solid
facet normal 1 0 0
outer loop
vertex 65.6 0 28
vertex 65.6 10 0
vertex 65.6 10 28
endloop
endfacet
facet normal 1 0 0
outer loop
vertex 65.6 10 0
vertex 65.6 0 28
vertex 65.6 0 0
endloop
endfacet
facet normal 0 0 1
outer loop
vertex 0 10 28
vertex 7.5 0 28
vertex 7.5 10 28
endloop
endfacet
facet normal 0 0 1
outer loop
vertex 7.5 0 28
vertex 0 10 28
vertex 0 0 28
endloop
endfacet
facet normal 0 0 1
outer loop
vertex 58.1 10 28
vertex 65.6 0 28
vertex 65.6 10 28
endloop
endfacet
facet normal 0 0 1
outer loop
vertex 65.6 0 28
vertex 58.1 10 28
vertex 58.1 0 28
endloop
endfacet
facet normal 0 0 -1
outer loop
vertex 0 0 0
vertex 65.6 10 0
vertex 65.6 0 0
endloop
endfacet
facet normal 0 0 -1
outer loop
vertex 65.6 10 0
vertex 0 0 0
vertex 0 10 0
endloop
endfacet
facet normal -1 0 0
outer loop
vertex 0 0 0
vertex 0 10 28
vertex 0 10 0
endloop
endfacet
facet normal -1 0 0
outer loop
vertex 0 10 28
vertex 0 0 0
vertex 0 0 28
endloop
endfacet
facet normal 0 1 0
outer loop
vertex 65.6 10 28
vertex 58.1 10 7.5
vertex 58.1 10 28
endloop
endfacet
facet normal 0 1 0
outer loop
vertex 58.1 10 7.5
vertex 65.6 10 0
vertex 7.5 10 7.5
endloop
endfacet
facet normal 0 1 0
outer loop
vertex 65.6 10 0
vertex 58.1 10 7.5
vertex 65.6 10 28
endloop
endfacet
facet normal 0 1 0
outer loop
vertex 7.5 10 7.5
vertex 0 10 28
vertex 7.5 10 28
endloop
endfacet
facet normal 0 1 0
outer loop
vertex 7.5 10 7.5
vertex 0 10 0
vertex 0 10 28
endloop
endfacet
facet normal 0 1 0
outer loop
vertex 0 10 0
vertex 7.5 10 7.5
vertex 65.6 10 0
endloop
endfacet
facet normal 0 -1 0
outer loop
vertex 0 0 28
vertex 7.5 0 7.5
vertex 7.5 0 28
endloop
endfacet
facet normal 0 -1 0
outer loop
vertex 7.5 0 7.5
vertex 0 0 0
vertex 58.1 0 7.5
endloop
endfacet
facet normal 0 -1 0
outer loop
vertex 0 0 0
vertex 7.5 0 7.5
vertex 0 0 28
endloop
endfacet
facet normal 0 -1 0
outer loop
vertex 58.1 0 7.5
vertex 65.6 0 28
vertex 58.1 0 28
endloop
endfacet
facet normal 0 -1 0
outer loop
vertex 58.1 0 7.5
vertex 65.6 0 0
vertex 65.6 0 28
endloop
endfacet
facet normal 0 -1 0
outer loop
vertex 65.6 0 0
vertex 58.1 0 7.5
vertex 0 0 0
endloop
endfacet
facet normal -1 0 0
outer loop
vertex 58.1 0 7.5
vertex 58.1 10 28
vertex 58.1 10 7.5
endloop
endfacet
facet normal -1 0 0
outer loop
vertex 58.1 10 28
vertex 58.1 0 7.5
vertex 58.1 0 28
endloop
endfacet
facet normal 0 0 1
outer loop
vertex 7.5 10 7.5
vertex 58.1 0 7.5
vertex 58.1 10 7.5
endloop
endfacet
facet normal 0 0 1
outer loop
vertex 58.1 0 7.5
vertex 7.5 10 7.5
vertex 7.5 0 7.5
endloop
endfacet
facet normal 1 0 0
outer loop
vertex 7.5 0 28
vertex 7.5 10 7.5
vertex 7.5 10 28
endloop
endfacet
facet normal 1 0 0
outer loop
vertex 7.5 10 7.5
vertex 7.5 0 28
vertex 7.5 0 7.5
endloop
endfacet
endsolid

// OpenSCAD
$fa=4; // default minimum facet angle is now 0.5
$fs=0.05; // default minimum facet size is now 0.05 mm

wallThickness = 7.5;
legThickness = 20.5;
legWidth = 50.6;
legGroundAngle=72.9;

laptopThickness = 16.2;
laptopGap = 1;

bracketHeight = 10;
prongLength = 100;

difference() {
  union() {
    cube([legWidth + wallThickness * 2, bracketHeight, legThickness + wallThickness]);
  }

  translate([wallThickness, -.01, wallThickness]) cube([legWidth, bracketHeight + .02, legThickness + .01]);
}
